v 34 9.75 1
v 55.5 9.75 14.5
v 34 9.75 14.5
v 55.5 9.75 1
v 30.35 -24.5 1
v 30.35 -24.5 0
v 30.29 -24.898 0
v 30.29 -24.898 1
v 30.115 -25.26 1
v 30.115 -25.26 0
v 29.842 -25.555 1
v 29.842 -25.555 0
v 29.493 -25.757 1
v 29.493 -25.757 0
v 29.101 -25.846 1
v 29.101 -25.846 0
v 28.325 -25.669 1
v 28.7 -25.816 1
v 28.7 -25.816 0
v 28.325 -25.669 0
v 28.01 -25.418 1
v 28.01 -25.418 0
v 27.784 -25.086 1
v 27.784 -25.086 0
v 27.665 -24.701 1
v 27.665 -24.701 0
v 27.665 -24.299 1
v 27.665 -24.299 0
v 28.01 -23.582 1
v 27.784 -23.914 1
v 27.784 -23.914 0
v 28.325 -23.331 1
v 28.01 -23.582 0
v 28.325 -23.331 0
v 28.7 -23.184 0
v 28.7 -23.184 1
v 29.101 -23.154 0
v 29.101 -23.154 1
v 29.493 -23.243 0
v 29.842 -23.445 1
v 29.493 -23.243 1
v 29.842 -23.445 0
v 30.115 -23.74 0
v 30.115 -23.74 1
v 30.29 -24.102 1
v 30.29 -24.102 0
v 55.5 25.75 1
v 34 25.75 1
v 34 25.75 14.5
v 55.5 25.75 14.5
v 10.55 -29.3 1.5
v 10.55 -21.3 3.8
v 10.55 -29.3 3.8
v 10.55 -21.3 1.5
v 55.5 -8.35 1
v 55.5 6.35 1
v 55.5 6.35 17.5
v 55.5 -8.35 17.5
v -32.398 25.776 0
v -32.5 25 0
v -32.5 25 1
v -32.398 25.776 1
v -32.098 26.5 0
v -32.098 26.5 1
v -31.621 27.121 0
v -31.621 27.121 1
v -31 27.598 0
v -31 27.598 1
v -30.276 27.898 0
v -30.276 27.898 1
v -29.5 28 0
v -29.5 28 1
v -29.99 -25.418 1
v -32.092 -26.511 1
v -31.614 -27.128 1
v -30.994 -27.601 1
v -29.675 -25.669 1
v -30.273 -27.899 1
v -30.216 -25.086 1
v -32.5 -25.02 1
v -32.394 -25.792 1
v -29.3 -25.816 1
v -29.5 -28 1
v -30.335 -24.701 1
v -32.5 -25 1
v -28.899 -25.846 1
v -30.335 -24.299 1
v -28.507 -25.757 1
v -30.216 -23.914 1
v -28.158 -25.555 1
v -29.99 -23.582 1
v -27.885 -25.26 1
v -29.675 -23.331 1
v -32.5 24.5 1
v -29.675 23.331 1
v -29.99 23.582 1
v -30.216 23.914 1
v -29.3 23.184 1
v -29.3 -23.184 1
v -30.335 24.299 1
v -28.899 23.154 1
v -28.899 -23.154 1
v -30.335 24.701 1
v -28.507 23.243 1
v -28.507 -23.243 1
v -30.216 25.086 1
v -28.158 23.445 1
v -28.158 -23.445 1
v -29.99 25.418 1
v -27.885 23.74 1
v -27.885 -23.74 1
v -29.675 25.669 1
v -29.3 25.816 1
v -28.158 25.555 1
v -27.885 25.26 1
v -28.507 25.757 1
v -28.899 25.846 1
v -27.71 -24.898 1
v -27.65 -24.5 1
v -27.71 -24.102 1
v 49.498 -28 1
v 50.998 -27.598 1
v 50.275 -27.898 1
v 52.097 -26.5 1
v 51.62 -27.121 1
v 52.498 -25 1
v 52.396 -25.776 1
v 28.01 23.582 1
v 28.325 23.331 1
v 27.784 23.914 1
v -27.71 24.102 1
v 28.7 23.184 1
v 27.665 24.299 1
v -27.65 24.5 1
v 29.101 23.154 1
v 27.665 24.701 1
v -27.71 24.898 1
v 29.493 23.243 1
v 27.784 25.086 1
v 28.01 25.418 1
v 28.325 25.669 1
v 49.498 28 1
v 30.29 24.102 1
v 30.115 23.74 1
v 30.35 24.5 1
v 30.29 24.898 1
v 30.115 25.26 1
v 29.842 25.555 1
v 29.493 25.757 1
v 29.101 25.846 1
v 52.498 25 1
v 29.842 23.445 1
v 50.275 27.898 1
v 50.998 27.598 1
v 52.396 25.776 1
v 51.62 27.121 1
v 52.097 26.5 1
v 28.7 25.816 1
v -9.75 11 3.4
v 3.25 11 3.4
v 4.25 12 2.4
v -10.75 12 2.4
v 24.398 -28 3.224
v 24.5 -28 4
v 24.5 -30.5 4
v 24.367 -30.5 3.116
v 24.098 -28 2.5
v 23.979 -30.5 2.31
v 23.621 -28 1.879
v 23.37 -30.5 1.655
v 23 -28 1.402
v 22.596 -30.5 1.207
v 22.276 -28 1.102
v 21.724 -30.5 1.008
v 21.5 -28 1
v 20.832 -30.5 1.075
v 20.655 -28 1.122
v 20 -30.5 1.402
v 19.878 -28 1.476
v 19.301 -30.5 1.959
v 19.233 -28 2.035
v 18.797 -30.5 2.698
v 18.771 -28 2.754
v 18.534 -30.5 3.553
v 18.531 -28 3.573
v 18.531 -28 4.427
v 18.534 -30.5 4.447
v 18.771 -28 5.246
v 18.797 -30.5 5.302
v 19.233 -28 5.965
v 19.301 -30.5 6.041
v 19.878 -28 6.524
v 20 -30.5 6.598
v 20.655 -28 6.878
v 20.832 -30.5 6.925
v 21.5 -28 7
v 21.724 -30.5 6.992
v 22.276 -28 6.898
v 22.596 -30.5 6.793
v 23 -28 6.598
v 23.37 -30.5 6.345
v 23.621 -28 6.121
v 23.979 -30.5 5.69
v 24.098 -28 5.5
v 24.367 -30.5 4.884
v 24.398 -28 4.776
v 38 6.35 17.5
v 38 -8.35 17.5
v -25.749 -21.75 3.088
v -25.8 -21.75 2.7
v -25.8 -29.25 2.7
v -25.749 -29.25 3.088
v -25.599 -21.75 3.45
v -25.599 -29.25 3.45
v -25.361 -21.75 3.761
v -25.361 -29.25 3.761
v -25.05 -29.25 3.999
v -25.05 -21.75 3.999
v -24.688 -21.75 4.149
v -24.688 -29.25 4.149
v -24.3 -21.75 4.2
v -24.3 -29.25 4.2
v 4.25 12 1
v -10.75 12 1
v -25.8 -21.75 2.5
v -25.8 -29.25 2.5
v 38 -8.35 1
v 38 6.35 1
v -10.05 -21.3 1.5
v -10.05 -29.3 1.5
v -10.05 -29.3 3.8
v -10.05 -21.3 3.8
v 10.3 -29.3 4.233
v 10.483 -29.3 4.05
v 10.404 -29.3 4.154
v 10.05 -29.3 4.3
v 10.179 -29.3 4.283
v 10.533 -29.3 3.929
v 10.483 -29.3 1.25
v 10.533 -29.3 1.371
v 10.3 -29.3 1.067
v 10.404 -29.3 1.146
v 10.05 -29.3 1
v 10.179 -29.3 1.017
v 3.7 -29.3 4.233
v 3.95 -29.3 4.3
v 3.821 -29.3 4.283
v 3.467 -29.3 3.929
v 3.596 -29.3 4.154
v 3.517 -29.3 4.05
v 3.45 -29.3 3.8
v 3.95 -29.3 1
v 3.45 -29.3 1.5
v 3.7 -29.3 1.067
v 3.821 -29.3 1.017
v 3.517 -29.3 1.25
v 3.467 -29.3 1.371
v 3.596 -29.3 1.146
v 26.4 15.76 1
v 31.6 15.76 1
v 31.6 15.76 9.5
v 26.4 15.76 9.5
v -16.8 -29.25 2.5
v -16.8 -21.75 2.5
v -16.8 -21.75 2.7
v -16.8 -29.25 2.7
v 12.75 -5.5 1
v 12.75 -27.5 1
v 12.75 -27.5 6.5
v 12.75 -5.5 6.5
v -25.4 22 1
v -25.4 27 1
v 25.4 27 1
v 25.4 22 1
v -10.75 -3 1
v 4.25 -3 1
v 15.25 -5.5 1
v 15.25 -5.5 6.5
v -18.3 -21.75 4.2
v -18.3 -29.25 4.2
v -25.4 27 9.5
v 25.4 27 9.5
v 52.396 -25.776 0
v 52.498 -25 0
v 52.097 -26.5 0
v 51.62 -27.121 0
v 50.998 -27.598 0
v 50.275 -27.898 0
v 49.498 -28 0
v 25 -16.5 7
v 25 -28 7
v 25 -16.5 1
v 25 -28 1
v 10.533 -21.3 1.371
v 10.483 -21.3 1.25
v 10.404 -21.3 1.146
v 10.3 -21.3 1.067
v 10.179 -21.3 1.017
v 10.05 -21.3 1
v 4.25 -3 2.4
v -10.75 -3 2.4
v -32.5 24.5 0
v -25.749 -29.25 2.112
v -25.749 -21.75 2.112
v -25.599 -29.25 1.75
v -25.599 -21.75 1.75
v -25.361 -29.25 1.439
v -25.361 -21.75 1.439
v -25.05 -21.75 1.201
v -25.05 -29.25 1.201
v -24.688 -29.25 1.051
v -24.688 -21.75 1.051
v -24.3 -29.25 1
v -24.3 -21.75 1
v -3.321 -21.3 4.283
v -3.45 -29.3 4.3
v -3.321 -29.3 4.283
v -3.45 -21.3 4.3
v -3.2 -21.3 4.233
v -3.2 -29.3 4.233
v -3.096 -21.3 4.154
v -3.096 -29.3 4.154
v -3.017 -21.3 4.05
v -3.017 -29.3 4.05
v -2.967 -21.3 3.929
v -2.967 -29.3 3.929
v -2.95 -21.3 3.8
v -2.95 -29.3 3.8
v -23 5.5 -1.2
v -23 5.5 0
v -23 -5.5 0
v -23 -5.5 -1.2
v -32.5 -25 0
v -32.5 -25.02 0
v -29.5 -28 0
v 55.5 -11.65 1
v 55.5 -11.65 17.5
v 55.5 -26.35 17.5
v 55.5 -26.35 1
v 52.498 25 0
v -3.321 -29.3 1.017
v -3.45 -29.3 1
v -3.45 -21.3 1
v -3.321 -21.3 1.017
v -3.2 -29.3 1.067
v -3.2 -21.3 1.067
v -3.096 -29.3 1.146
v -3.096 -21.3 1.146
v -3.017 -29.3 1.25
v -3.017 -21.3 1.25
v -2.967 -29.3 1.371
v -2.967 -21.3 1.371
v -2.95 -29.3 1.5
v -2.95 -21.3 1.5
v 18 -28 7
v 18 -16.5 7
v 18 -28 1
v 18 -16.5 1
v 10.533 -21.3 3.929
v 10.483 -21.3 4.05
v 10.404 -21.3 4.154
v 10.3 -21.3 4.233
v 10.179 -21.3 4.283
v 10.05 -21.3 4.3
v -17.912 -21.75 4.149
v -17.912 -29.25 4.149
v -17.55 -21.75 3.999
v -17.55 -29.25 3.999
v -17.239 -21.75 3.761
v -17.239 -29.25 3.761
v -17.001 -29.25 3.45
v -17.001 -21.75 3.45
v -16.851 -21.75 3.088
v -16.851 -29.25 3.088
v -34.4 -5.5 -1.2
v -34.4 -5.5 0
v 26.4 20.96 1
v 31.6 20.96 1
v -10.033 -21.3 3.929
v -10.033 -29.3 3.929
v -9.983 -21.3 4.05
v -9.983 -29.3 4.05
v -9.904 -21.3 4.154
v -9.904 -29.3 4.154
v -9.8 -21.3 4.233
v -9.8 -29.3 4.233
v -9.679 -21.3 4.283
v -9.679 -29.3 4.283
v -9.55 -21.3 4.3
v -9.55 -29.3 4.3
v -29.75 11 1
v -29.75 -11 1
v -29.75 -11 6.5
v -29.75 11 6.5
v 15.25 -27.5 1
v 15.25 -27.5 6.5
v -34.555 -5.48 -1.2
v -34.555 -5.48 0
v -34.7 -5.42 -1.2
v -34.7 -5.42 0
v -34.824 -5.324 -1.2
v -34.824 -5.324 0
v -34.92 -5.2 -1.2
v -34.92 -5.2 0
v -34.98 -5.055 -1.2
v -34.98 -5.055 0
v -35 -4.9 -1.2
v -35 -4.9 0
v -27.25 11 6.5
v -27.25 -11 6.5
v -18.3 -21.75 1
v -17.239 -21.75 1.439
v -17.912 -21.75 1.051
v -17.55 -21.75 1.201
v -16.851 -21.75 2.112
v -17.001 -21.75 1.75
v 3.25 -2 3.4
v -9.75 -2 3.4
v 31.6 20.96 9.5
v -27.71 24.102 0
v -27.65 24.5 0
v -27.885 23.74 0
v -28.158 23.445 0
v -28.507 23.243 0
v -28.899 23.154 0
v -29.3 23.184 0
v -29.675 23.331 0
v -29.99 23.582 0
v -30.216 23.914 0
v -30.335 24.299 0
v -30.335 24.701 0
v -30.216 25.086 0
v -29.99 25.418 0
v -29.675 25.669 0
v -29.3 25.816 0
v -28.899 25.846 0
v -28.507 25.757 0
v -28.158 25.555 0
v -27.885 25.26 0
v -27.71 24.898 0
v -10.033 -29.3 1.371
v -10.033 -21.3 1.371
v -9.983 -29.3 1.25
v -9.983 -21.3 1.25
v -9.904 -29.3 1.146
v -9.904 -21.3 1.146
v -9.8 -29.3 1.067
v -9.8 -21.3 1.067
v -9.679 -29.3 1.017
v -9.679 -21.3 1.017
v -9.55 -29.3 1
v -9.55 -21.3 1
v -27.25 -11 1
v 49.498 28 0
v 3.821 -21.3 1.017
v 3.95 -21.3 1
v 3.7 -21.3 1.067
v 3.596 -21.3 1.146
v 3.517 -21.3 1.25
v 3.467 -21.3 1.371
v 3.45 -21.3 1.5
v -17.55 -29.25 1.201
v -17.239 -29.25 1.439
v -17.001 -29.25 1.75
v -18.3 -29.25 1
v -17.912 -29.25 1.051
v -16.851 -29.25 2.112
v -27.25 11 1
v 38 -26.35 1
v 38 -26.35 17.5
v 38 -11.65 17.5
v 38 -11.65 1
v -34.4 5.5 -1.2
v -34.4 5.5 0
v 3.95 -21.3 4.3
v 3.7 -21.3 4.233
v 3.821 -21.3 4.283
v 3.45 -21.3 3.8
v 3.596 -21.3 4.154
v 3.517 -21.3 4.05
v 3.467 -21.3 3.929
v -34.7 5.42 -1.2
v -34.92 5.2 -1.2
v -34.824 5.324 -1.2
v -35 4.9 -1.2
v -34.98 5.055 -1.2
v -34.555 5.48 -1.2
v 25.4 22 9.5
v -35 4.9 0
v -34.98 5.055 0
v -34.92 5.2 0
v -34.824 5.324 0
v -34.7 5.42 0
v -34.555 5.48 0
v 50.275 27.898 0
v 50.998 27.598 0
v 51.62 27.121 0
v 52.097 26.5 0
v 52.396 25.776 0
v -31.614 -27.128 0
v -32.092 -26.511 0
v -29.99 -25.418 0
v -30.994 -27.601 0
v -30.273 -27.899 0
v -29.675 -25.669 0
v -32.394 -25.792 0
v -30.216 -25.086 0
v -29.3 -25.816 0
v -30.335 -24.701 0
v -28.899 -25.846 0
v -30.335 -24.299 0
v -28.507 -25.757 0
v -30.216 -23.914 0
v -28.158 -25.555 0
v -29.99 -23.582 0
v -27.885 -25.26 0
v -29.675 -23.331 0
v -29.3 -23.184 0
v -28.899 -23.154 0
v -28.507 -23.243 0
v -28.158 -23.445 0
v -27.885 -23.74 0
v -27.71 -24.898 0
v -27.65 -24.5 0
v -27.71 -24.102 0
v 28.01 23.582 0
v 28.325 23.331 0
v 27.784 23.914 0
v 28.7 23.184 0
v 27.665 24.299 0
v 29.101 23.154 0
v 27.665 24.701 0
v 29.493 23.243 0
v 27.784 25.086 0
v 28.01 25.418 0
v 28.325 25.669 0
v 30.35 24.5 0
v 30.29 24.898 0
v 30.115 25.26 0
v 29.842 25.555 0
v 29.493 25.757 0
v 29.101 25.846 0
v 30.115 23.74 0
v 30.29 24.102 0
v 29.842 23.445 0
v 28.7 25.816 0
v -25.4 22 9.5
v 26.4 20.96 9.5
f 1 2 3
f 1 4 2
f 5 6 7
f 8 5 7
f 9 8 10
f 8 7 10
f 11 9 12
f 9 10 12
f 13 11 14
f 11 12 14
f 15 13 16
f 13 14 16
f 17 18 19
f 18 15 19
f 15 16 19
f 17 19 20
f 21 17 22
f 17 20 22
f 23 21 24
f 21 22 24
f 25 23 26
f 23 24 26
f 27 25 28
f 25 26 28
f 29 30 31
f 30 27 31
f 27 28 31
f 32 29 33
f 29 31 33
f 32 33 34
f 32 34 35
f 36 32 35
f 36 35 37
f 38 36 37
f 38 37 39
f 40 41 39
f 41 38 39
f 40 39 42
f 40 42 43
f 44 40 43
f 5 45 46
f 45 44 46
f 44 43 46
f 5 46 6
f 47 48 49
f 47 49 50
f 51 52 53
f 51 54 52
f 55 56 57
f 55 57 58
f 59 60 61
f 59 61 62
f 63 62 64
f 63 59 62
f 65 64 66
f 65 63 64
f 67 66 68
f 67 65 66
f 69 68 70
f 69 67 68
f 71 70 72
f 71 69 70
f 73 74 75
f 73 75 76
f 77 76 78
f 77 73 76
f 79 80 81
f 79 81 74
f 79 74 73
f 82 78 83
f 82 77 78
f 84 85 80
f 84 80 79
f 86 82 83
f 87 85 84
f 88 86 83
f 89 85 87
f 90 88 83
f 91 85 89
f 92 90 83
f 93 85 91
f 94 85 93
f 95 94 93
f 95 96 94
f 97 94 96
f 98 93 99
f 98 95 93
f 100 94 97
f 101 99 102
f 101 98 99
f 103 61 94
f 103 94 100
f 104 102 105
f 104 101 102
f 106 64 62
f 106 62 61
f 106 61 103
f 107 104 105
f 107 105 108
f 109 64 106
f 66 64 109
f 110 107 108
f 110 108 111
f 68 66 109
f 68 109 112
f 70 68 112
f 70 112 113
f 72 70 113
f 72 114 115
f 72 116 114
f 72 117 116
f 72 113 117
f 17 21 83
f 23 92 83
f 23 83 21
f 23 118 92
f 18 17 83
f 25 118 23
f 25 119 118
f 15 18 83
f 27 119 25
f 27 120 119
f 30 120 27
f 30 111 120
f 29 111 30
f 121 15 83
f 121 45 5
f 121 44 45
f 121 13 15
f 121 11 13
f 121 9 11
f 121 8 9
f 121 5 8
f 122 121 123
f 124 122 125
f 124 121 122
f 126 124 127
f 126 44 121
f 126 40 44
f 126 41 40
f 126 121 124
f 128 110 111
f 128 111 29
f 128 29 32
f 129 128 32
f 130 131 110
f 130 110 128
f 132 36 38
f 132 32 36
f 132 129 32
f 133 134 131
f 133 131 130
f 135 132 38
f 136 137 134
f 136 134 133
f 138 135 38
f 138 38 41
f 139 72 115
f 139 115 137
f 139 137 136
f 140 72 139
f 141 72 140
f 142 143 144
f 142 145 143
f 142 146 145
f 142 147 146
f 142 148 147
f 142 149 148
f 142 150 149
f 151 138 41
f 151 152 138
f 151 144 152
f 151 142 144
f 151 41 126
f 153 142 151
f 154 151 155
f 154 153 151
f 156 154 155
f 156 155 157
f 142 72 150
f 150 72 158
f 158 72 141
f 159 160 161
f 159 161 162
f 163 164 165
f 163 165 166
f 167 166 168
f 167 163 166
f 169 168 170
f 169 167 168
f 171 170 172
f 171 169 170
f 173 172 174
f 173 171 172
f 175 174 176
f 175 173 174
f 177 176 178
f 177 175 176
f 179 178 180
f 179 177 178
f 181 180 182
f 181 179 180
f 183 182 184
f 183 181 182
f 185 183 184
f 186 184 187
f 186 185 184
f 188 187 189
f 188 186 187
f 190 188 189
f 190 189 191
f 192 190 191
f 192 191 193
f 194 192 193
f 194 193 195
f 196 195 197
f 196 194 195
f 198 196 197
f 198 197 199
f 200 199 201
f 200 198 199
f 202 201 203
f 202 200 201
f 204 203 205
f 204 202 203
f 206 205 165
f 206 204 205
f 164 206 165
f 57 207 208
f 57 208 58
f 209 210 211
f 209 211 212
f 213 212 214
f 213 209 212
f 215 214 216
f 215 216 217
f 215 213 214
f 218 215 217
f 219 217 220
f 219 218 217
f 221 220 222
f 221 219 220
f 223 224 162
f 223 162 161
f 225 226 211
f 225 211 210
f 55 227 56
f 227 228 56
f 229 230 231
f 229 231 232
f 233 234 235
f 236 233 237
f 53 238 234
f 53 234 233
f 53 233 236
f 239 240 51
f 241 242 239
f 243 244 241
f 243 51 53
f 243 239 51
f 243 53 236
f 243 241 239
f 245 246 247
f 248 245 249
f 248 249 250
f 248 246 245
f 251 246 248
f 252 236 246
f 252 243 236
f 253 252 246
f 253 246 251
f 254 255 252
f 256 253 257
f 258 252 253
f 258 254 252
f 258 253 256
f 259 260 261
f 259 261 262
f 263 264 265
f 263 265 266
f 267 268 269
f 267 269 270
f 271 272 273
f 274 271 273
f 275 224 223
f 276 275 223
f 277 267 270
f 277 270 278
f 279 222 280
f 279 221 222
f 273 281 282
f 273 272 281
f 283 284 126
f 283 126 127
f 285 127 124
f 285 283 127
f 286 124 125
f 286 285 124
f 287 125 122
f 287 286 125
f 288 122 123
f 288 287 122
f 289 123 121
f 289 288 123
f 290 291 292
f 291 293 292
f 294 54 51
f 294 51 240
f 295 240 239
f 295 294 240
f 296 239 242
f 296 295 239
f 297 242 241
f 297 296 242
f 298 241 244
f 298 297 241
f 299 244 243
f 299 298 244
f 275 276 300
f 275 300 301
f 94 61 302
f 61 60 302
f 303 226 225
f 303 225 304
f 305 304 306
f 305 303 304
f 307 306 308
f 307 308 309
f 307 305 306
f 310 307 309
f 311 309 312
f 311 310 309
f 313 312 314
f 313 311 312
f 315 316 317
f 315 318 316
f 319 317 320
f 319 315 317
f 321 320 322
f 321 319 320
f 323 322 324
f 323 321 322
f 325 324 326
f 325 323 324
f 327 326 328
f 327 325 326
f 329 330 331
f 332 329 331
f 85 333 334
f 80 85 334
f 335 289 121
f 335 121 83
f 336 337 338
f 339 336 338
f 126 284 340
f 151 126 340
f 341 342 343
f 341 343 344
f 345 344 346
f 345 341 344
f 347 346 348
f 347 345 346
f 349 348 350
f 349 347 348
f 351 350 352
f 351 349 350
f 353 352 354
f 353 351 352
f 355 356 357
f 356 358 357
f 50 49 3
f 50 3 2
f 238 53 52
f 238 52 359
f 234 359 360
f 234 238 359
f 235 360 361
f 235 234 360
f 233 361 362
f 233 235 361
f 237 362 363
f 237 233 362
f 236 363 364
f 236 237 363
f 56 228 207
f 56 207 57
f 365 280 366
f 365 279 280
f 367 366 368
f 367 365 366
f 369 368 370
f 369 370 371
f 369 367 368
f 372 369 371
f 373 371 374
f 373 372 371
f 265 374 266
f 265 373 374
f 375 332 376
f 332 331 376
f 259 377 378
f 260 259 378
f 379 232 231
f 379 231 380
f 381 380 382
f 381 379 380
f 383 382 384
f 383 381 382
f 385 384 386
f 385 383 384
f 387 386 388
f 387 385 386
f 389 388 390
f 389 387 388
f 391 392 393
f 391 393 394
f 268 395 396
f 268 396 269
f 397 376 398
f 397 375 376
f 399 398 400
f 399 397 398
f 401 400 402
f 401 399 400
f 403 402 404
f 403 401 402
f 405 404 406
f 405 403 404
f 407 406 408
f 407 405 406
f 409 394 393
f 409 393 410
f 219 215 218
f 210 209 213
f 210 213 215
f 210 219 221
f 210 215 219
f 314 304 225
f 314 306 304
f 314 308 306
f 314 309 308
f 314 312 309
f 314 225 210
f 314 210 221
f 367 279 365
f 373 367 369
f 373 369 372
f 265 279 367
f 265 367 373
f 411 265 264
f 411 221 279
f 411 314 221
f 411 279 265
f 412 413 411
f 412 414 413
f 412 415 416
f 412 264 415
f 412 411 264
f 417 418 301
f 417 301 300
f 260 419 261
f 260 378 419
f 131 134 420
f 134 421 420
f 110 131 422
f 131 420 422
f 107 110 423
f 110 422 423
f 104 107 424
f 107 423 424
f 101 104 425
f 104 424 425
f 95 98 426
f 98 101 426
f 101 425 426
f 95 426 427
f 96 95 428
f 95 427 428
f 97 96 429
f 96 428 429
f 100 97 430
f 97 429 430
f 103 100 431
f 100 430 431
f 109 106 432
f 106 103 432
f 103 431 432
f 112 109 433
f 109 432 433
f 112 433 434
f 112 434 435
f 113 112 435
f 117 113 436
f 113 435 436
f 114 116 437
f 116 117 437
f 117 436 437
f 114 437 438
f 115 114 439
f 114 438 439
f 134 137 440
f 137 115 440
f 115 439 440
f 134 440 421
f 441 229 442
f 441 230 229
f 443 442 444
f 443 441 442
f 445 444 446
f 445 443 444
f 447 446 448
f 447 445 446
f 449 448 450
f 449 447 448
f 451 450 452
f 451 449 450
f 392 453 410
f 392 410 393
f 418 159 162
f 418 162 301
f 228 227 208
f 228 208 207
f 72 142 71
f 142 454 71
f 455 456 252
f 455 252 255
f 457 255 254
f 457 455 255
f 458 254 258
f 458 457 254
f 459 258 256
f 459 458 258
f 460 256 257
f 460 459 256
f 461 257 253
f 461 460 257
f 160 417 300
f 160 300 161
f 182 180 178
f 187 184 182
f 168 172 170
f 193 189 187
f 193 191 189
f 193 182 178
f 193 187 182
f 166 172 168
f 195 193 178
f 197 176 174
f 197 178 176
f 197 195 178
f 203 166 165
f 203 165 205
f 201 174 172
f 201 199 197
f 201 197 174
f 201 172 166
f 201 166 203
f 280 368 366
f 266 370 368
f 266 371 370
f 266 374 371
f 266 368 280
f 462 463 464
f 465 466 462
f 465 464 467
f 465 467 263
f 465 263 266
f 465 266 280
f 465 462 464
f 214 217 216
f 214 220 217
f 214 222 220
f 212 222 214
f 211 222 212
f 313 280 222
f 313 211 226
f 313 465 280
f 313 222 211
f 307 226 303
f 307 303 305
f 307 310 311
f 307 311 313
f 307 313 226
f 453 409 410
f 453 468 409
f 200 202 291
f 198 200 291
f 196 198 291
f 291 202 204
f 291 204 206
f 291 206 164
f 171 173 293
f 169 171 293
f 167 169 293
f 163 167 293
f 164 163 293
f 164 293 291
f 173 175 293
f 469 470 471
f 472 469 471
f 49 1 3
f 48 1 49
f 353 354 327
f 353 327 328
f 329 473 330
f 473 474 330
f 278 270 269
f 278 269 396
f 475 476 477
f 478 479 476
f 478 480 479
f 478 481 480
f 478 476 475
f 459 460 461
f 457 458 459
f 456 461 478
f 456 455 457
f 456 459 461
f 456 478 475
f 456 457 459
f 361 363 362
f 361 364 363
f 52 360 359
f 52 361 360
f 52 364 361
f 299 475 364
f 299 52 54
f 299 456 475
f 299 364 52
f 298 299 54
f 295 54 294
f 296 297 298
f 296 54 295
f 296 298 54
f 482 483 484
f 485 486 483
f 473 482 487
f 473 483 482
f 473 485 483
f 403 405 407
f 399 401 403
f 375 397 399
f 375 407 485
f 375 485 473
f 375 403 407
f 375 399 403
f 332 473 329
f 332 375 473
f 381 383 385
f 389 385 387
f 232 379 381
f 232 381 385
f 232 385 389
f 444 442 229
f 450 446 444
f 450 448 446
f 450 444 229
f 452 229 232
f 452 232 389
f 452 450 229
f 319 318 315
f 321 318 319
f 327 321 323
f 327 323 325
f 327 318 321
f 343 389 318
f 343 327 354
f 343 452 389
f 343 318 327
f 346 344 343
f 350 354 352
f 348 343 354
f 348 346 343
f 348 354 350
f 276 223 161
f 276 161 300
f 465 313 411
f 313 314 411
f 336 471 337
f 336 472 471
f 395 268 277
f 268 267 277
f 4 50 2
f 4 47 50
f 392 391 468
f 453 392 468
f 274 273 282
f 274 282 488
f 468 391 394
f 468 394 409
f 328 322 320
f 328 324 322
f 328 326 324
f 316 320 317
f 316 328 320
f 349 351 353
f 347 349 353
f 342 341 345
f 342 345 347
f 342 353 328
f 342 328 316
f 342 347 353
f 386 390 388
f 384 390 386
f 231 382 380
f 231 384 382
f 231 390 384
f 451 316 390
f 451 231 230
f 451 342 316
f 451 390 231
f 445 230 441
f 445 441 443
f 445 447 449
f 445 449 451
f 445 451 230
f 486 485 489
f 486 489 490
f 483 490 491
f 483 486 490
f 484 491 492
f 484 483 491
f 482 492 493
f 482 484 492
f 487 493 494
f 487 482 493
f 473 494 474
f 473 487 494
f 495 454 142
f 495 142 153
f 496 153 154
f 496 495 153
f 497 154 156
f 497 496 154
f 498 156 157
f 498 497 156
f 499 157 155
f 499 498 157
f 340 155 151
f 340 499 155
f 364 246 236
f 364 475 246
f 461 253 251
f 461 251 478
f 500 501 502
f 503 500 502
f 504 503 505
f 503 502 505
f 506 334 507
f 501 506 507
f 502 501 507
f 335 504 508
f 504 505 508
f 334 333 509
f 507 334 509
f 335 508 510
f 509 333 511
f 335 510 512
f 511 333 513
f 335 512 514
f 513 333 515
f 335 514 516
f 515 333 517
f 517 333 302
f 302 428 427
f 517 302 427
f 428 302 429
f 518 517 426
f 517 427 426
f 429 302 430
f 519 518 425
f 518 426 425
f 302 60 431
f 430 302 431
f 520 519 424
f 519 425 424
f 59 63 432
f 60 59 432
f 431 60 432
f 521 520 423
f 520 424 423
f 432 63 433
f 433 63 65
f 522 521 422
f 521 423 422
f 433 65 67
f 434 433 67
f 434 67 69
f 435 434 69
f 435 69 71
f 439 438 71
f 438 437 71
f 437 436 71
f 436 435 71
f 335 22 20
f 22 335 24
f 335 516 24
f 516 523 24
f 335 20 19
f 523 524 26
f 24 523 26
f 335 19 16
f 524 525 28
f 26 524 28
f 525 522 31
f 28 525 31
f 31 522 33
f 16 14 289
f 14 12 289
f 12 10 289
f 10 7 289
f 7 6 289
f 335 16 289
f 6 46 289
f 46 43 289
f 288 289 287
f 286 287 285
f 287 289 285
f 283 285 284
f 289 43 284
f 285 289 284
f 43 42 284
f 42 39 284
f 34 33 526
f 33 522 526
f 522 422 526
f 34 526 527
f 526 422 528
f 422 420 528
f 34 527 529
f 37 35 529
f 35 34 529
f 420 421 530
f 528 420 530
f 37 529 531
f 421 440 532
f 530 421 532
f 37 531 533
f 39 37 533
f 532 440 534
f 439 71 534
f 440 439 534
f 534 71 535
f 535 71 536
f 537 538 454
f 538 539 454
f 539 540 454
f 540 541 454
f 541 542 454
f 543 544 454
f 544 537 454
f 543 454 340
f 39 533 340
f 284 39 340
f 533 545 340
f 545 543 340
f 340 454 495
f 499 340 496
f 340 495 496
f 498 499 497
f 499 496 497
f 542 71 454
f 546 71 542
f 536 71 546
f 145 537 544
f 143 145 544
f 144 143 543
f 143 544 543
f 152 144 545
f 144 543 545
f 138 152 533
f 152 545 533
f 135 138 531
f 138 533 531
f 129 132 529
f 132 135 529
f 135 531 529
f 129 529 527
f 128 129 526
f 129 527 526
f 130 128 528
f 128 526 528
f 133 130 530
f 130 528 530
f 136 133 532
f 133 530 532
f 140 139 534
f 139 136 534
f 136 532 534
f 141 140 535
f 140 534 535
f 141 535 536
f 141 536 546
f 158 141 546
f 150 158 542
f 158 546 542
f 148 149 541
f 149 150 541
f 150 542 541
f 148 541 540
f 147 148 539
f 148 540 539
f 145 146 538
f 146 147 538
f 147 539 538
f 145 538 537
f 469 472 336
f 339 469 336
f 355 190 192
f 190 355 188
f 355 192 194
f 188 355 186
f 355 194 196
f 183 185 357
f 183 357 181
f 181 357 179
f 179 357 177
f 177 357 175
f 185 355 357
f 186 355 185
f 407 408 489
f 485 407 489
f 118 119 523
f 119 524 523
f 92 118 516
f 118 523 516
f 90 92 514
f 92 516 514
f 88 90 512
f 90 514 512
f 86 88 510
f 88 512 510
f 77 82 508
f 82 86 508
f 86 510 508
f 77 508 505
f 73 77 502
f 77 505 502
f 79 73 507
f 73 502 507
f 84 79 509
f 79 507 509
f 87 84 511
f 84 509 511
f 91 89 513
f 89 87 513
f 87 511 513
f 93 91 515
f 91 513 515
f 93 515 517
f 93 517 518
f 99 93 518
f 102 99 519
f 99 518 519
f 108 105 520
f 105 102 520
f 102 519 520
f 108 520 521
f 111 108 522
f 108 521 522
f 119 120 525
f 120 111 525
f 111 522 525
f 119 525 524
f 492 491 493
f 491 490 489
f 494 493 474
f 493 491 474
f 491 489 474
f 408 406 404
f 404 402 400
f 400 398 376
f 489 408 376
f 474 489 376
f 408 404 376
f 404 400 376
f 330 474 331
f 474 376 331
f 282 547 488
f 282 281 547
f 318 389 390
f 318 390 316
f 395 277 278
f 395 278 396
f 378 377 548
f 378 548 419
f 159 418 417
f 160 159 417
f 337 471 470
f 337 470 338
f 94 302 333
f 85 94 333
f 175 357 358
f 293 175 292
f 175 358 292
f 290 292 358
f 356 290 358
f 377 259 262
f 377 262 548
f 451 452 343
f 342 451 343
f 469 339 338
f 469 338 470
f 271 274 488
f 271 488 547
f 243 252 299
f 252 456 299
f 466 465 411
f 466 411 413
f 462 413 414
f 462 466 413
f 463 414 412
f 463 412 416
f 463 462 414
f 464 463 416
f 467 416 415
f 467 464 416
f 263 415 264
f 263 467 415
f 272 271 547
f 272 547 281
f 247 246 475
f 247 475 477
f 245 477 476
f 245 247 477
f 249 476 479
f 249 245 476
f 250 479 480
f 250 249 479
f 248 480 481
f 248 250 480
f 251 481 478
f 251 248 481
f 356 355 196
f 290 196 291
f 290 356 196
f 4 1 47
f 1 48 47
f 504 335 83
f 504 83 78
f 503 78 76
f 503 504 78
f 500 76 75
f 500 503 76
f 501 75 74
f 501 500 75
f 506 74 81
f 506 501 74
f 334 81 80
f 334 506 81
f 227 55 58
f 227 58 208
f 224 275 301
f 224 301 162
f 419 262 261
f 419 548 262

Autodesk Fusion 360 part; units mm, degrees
sketch "Skizze4" plane through (0, 0, 0) normal (0, 0, 1) x (1, 0, 0)
  line L0 (52.4985, -25) -> (52.4985, 25)
  line L1 (-32.5, 24.5) -> (-32.5, -25.0196)
  line L2 (49.4985, 28) -> (-29.5, 28)
  line L3 (-32.5, 25) -> (-32.5, 24.5)
  line L4 (49.4985, -28) -> (-29.5, -28)
  line L5 (-32.5, -25) -> (-32.5, -25.0196)
  circle A0 centre (29, 24.5) radius 1.35
  circle A1 centre (29, -24.5) radius 1.35
  circle A2 centre (-29, -24.5) radius 1.35
  circle A3 centre (-29, 24.5) radius 1.35
  arc A4 (-29.5, 28) -> (-32.5, 25) centre (-29.5, 25) ccw
  arc A5 (-32.5, -25) -> (-29.5, -28) centre (-29.5, -25) ccw
  arc A6 (49.4985, -28) -> (52.4985, -25) centre (49.4985, -25) ccw
  arc A7 (52.4985, 25) -> (49.4985, 28) centre (49.4985, 25) ccw
  line L6 (-29, 24.5) -> (29, -24.5) construction
  line L7 (29, 24.5) -> (-29, -24.5) construction
  line L8 (-29, 24.5) -> (-29, -24.5) construction
  line L9 (-29, -24.5) -> (29, -24.5) construction
  line L10 (29, -24.5) -> (29, 24.5) construction
  line L11 (-29, 24.5) -> (29, 24.5) construction
  point P0 (-32.5, 28)
  dimension "d3" = 85
  dimension "d6" = 3.5
  dimension "d11" = 2.7
  dimension "d17" = 3
  dimension "d57" = 49
  dimension "d58" = 58
  dimension "d61" = 56
  dimension "d62" = 3.5
  dimension "d63" = 3.5
extrude "Extrusion7" add sketch "Skizze4" along normal blind 1 makes body 1
copy_body "Körper->Berechn3" bodies 1 removing the originals makes body 2 in component "Baseplate"
sketch "Skizze9" plane through (0, 0, 1) normal (0, 0, 1) x (1, 0, 0)
  arc A0 (52.4999, 24.6406) -> (49.5215, 28) centre (49.5215, 25) ccw
  line L0 (52.4999, -25) -> (52.4999, 24.6406) construction
  line L1 (49.5215, 28) -> (-29.5, 28) construction
  arc A1 (49.4999, -28) -> (52.4999, -25) centre (49.4999, -25) ccw construction
  line L2 (49.4999, -28) -> (-29.5, -28) construction
  circle A2 centre (29, -24.5) radius 1.3
  arc A3 (-29.5, 28) -> (-32.5, 25) centre (-29.5, 25) ccw construction
  line L3 (-32.5, 24.5) -> (-32.5, -25.0196) construction
  arc A4 (-32.5, -25) -> (-29.5, -28) centre (-29.5, -25) ccw construction
  circle A5 centre (29, 24.5) radius 1.3
  circle A6 centre (-29, 24.5) radius 1.3
  circle A7 centre (-29, -24.5) radius 1.3
  line L4 (-32.5, 25) -> (-32.5, 24.5) construction
  circle A8 centre (29, -24.5) radius 1.3
  circle A9 centre (29, 24.5) radius 1.3
  circle A10 centre (-29, -24.5) radius 1.3
  circle A11 centre (-29, 24.5) radius 1.3
  arc A12 (49.4999, -28) -> (52.4999, -25) centre (49.4999, -25) ccw
  line L5 (52.4999, -25) -> (52.4999, 24.6406)
  arc A13 (52.4999, 24.6406) -> (49.5215, 28) centre (49.5215, 25) ccw
  line L6 (49.5215, 28) -> (-29.5, 28)
  arc A14 (-29.5, 28) -> (-32.5, 25) centre (-29.5, 25) ccw
  line L7 (-32.5, 25) -> (-32.5, -25)
  arc A15 (-32.5, -25) -> (-29.5, -28) centre (-29.5, -25) ccw
  line L8 (-29.5, -28) -> (49.4999, -28)
  line L9 (-16.8, -29.25) -> (-25.8, -29.25)
  line L10 (-25.8, -29.25) -> (-25.8, -21.75)
  line L11 (-25.8, -21.75) -> (-16.8, -21.75)
  line L12 (-16.8, -21.75) -> (-16.8, -29.25)
  line L13 (-16.8, -29.25) -> (-25.8, -21.75) construction
  line L14 (-25.8, -29.25) -> (-16.8, -21.75) construction
  line L15 (-2.95, -29.3) -> (-10.05, -29.3)
  line L16 (-10.05, -29.3) -> (-10.05, -21.3)
  line L17 (-10.05, -21.3) -> (-2.95, -21.3)
  line L18 (-2.95, -21.3) -> (-2.95, -29.3)
  line L19 (-2.95, -29.3) -> (-10.05, -21.3) construction
  line L20 (-10.05, -29.3) -> (-2.95, -21.3) construction
  line L21 (10.55, -29.3) -> (3.45, -29.3)
  line L22 (3.45, -29.3) -> (3.45, -21.3)
  line L23 (3.45, -21.3) -> (10.55, -21.3)
  line L24 (10.55, -21.3) -> (10.55, -29.3)
  line L25 (10.55, -29.3) -> (3.45, -21.3) construction
  line L26 (3.45, -29.3) -> (10.55, -21.3) construction
  line L27 (18, -28) -> (25, -28)
  line L28 (25, -28) -> (25, -16.5)
  line L29 (25, -16.5) -> (18, -16.5)
  line L30 (18, -16.5) -> (18, -28)
  line L31 (18, -28) -> (25, -16.5) construction
  line L32 (25, -28) -> (18, -16.5) construction
  line L33 (55.4999, -26.35) -> (37.9999, -26.35)
  line L34 (37.9999, -26.35) -> (37.9999, -11.65)
  line L35 (37.9999, -11.65) -> (55.4999, -11.65)
  line L36 (55.4999, -11.65) -> (55.4999, -26.35)
  line L37 (55.4999, -26.35) -> (37.9999, -11.65) construction
  line L38 (37.9999, -26.35) -> (55.4999, -11.65) construction
  line L39 (55.4999, -8.35) -> (37.9999, -8.35)
  line L40 (37.9999, -8.35) -> (37.9999, 6.35)
  line L41 (37.9999, 6.35) -> (55.4999, 6.35)
  line L42 (55.4999, 6.35) -> (55.4999, -8.35)
  line L43 (55.4999, -8.35) -> (37.9999, 6.35) construction
  line L44 (37.9999, -8.35) -> (55.4999, 6.35) construction
  line L45 (55.4999, 9.75) -> (33.9999, 9.75)
  line L46 (33.9999, 9.75) -> (33.9999, 25.75)
  line L47 (33.9999, 25.75) -> (55.4999, 25.75)
  line L48 (55.4999, 25.75) -> (55.4999, 9.75)
  line L49 (55.4999, 9.75) -> (33.9999, 25.75) construction
  line L50 (33.9999, 9.75) -> (55.4999, 25.75) construction
  line L51 (25.4, 22) -> (-25.4, 22)
  line L52 (-25.4, 22) -> (-25.4, 27)
  line L53 (-25.4, 27) -> (25.4, 27)
  line L54 (25.4, 27) -> (25.4, 22)
  line L55 (25.4, 22) -> (-25.4, 27) construction
  line L56 (-25.4, 22) -> (25.4, 27) construction
  line L57 (-29, 24.5) -> (29, 24.5) construction
  line L58 (-27.25, -11) -> (-29.75, -11)
  line L59 (-29.75, -11) -> (-29.75, 11)
  line L60 (-29.75, 11) -> (-27.25, 11)
  line L61 (-27.25, 11) -> (-27.25, -11)
  line L62 (-27.25, -11) -> (-29.75, 11) construction
  line L63 (-29.75, -11) -> (-27.25, 11) construction
  line L64 (4.25, -3) -> (-10.75, -3)
  line L65 (-10.75, -3) -> (-10.75, 12)
  line L66 (-10.75, 12) -> (4.25, 12)
  line L67 (4.25, 12) -> (4.25, -3)
  line L68 (4.25, -3) -> (-10.75, 12) construction
  line L69 (-10.75, -3) -> (4.25, 12) construction
  line L70 (15.25, -27.5) -> (12.75, -27.5)
  line L71 (12.75, -27.5) -> (12.75, -5.5)
  line L72 (12.75, -5.5) -> (15.25, -5.5)
  line L73 (15.25, -5.5) -> (15.25, -27.5)
  line L74 (15.25, -27.5) -> (12.75, -5.5) construction
  line L75 (12.75, -27.5) -> (15.25, -5.5) construction
  line L76 (-16.6, -8.625) -> (-24.4, -8.625)
  line L77 (-24.4, -8.625) -> (-24.4, -6.375)
  line L78 (-24.4, -6.375) -> (-16.6, -6.375)
  line L79 (-16.6, -6.375) -> (-16.6, -8.625)
  line L80 (-16.6, -8.625) -> (-24.4, -6.375) construction
  line L81 (-24.4, -8.625) -> (-16.6, -6.375) construction
  line L82 (-2.95, -29.3) -> (3.45, -29.3) construction
  line L83 (-2.95, -21.3) -> (3.45, -21.3) construction
  line L84 (55.4999, -11.65) -> (55.4999, -8.35) construction
  line L85 (55.4999, 6.35) -> (55.4999, 9.75) construction
  line L86 (31.6, 15.76) -> (26.4, 15.76)
  line L87 (26.4, 15.76) -> (26.4, 20.96)
  line L88 (26.4, 20.96) -> (31.6, 20.96)
  line L89 (31.6, 20.96) -> (31.6, 15.76)
  line L90 (31.6, 15.76) -> (26.4, 20.96) construction
  line L91 (26.4, 15.76) -> (31.6, 20.96) construction
  line L92 (29, 24.5) -> (29, 18.36) construction
  line L93 (-32.5, 0) -> (52.4999, 0) construction
  line L94 (-29, -24.5) -> (29, -24.5) construction
  point P0 (-21.3, -25.5)
  point P1 (-6.5, -25.3)
  point P2 (7, -25.3)
  point P3 (21.5, -22.25)
  point P4 (46.7499, -19)
  point P5 (46.7499, -1)
  point P6 (44.7499, 17.75)
  point P7 (0, 24.5)
  point P8 (-28.5, 0)
  point P9 (-3.25, 4.5)
  point P10 (14, -16.5)
  point P11 (-20.5, -7.5)
  point P12 (29, 18.36)
  dimension "d66" = 9
  dimension "d67" = 27
  dimension "d68" = 45.75
  dimension "d69" = 29
  dimension "d70" = 7.7
  dimension "d71" = 14.8
  dimension "d72" = 13.5
  dimension "d73" = 7.1
  dimension "d74" = 7.1
  dimension "d75" = 8
  dimension "d76" = 17.5
  dimension "d77" = 14.7
  dimension "d78" = 1.3
  dimension "d79" = 11.5
  dimension "d80" = 7
  dimension "d82" = 7
  dimension "d84" = 7.5
  dimension "d85" = 3
  dimension "d86" = 21.5
  dimension "d87" = 16
  dimension "d88" = 5.2
  dimension "d89" = 5.2
  dimension "d90" = 11.5
  dimension "d91" = 17.5
  dimension "d92" = 14.7
  dimension "d122" = 12
  dimension "d123" = 20.5
  dimension "d124" = 4
  dimension "d125" = 32.5
  dimension "d126" = 25.75
  dimension "d127" = 1.25
  dimension "d128" = 9
  dimension "d129" = 7.5
  dimension "d130" = 22
  dimension "d131" = 2.5
  dimension "d133" = 6.14
  dimension "d134" = 15
  dimension "d137" = 5
  dimension "d138" = 50.8
  dimension "d139" = 7.8
  dimension "d140" = 2.25
  dimension "d141" = 2.5
  dimension "d142" = 22
extrude "Extrusion8" add sketch "Skizze9" along normal blind 3.2 separate body contours L8 L10 L11 L12 | L8 L9 L10 L12 makes body 3
extrude "Extrusion9" add sketch "Skizze9" along normal blind 3.3 separate body contours L8 L16 L17 L18 | L8 L15 L16 L18 | L8 L21 L22 L24 | L8 L22 L23 L24 makes body 4 at (-7.6833, -26.6333, 1) makes body 5 at (5.8167, -23.9667, 1)
extrude "Extrusion10" add sketch "Skizze9" along normal blind 5.5 separate body contours L58 L59 L60 L61 | L70 L71 L72 L73 makes body 6 at (12.75, -20.1667, 2.8333) makes body 7 at (-29.75, -3.6667, 2.8333)
extrude "Extrusion11" add sketch "Skizze9" along normal blind 6 separate body contours L8 L27 L28 L29 L30 makes body 8
extrude "Extrusion12" add sketch "Skizze9" along normal blind 16.5 separate body contours L5 L39 L41 L42 | L5 L39 L40 L41 | A12 L5 L33 L35 L36 | A12 L5 L33 L34 L35 makes body 9 at (49.6666, -26.35, 6.5) makes body 10 at (43.8332, 6.35, 6.5)
extrude "Extrusion13" add sketch "Skizze9" along normal blind 13.5 separate body contours A0 L5 A13 L45 L46 L47 | A0 L5 A13 L45 L47 L48 makes body 11
extrude "Extrusion14" add sketch "Skizze9" along normal blind 8.5 separate body contours L51 L52 L53 L54 | L86 L87 L88 L89 makes body 12 at (8.4667, 22, 3.8333) makes body 13 at (31.6, 19.2267, 3.8333)
extrude "Extrusion15" add sketch "Skizze9" along normal blind 2.4 separate body contours L64 L65 L66 L67 makes body 14
sketch "Skizze10" plane through (0, -28, 0) normal (0, -1, 0) x (1, 0, 0)
  line L0 (18, 1) -> (25, 1)
  line L1 (25, 1) -> (25, 7)
  line L2 (25, 7) -> (18, 7)
  line L3 (18, 7) -> (18, 1)
  circle A0 centre (21.5, 4) radius 3
  line L4 (18, 7) -> (25, 1) construction
  line L5 (25, 7) -> (18, 1) construction
extrude "Extrusion16" add sketch "Skizze10" along normal blind 2.5 contours A0 bodies 8
fillet "Abrundung1" radius 1.5 4 edges at (-25.8, -25.5, 4.2) (-25.8, -25.5, 1) (-16.8, -25.5, 4.2) (-16.8, -25.5, 1) on bodies 3
chamfer "Fase4" distance 1 angle 45 4 edges at (-10.75, 4.5, 3.4) (-3.25, -3, 3.4) (-3.25, 12, 3.4) (4.25, 4.5, 3.4) on bodies 14
fillet "Abrundung2" radius 0.5 8 edges at (-10.05, -25.3, 4.3) (-2.95, -25.3, 4.3) (-10.05, -25.3, 1) (-2.95, -25.3, 1) (3.45, -25.3, 1) (3.45, -25.3, 4.3) (10.55, -25.3, 4.3) (10.55, -25.3, 1) on bodies 4 5
copy_body "Körper->Berechn4" bodies 3 removing the originals makes body 15 in component "Power USB C"
copy_body "Körper->Berechn5" bodies 5 removing the originals makes body 16 in component "Micro HDMI 2"
copy_body "Körper->Berechn6" bodies 8 removing the originals makes body 17 in component "3.5 mm Audio"
copy_body "Körper->Berechn7" bodies 4 removing the originals makes body 18 in component "Micro HDMI 1"
copy_body "Körper->Berechn8" bodies 9 removing the originals makes body 19 in component "USB 2.0"
copy_body "Körper->Berechn9" bodies 7 removing the originals makes body 20 in component "Display"
copy_body "Körper->Berechn10" bodies 14 removing the originals makes body 21 in component "Processor"
copy_body "Körper->Berechn11" bodies 11 removing the originals makes body 22 in component "Ethernet "
copy_body "Körper->Berechn12" bodies 6 removing the originals makes body 23 in component "Kamera"
copy_body "Körper->Berechn13" bodies 12 removing the originals makes body 24 in component "GPIO 40"
copy_body "Körper->Berechn14" bodies 10 removing the originals makes body 25 in component "USB 3.0"
copy_body "Körper->Berechn15" bodies 13 removing the originals makes body 26 in component "PoE"
sketch "Skizze11" plane through (0, 0, 0) normal (0, 0, -1) x (1, 0, 0)
  circle A0 centre (29, 24.5) radius 1.35
  circle A1 centre (-29, 24.5) radius 1.35
  circle A2 centre (-29, -24.5) radius 1.35
  circle A3 centre (29, -24.5) radius 1.35
  arc A4 (52.4985, 25) -> (49.4985, 28) centre (49.4985, 25) ccw
  line L0 (49.4985, 28) -> (-29.5, 28)
  arc A5 (-29.5, 28) -> (-32.5, 25) centre (-29.5, 25) ccw
  line L1 (-32.5, 25) -> (-32.5, -25)
  arc A6 (-32.5, -25) -> (-29.5, -28) centre (-29.5, -25) ccw
  line L2 (-29.5, -28) -> (49.4985, -28)
  arc A7 (49.4985, -28) -> (52.4985, -25) centre (49.4985, -25) ccw
  line L3 (52.4985, -25) -> (52.4985, 25)
  line L4 (-29, 24.5) -> (-29, -24.5) construction
  line L5 (-23, 5.5) -> (-35, 5.5)
  line L6 (-35, 5.5) -> (-35, -5.5)
  line L7 (-35, -5.5) -> (-23, -5.5)
  line L8 (-23, -5.5) -> (-23, 5.5)
  line L9 (-23, 5.5) -> (-35, -5.5) construction
  line L10 (-35, 5.5) -> (-23, -5.5) construction
  point P0 (-29, 0)
  dimension "d114" = 11
  dimension "d115" = 12
extrude "Extrusion1" add sketch "Skizze11" along normal blind 1.2 separate body contours L1 L5 L7 L8 | L1 L5 L6 L7 makes body 27 in component "Baseplate"
fillet "Abrundung1'" radius 0.6 2 edges at (-35, 5.5, -0.6) (-35, -5.5, -0.6) on bodies 27 in component "Baseplate"
component "Baseplate" placed x (1, 0, 0) y (0, 1, 0) z (0, 0, 1) at (0, 0, 0)
component "Power USB C" placed x (1, 0, 0) y (0, 1, 0) z (0, 0, 1) at (0, 0, 0)
component "Micro HDMI 2" placed x (1, 0, 0) y (0, 1, 0) z (0, 0, 1) at (0, 0, 0)
component "3.5 mm Audio" placed x (1, 0, 0) y (0, 1, 0) z (0, 0, 1) at (0, 0, 0)
component "Micro HDMI 1" placed x (1, 0, 0) y (0, 1, 0) z (0, 0, 1) at (0, 0, 0)
component "USB 2.0" placed x (1, 0, 0) y (0, 1, 0) z (0, 0, 1) at (0, 0, 0)
component "Display" placed x (1, 0, 0) y (0, 1, 0) z (0, 0, 1) at (0, 0, 0)
component "Processor" placed x (1, 0, 0) y (0, 1, 0) z (0, 0, 1) at (0, 0, 0)
component "Ethernet " placed x (1, 0, 0) y (0, 1, 0) z (0, 0, 1) at (0, 0, 0)
component "Kamera" placed x (1, 0, 0) y (0, 1, 0) z (0, 0, 1) at (0, 0, 0)
component "GPIO 40" placed x (1, 0, 0) y (0, 1, 0) z (0, 0, 1) at (0, 0, 0)
component "USB 3.0" placed x (1, 0, 0) y (0, 1, 0) z (0, 0, 1) at (0, 0, 0)
component "PoE" placed x (1, 0, 0) y (0, 1, 0) z (0, 0, 1) at (0, 0, 0)
equation "d91 = d76"
equation "d92 = d77"
